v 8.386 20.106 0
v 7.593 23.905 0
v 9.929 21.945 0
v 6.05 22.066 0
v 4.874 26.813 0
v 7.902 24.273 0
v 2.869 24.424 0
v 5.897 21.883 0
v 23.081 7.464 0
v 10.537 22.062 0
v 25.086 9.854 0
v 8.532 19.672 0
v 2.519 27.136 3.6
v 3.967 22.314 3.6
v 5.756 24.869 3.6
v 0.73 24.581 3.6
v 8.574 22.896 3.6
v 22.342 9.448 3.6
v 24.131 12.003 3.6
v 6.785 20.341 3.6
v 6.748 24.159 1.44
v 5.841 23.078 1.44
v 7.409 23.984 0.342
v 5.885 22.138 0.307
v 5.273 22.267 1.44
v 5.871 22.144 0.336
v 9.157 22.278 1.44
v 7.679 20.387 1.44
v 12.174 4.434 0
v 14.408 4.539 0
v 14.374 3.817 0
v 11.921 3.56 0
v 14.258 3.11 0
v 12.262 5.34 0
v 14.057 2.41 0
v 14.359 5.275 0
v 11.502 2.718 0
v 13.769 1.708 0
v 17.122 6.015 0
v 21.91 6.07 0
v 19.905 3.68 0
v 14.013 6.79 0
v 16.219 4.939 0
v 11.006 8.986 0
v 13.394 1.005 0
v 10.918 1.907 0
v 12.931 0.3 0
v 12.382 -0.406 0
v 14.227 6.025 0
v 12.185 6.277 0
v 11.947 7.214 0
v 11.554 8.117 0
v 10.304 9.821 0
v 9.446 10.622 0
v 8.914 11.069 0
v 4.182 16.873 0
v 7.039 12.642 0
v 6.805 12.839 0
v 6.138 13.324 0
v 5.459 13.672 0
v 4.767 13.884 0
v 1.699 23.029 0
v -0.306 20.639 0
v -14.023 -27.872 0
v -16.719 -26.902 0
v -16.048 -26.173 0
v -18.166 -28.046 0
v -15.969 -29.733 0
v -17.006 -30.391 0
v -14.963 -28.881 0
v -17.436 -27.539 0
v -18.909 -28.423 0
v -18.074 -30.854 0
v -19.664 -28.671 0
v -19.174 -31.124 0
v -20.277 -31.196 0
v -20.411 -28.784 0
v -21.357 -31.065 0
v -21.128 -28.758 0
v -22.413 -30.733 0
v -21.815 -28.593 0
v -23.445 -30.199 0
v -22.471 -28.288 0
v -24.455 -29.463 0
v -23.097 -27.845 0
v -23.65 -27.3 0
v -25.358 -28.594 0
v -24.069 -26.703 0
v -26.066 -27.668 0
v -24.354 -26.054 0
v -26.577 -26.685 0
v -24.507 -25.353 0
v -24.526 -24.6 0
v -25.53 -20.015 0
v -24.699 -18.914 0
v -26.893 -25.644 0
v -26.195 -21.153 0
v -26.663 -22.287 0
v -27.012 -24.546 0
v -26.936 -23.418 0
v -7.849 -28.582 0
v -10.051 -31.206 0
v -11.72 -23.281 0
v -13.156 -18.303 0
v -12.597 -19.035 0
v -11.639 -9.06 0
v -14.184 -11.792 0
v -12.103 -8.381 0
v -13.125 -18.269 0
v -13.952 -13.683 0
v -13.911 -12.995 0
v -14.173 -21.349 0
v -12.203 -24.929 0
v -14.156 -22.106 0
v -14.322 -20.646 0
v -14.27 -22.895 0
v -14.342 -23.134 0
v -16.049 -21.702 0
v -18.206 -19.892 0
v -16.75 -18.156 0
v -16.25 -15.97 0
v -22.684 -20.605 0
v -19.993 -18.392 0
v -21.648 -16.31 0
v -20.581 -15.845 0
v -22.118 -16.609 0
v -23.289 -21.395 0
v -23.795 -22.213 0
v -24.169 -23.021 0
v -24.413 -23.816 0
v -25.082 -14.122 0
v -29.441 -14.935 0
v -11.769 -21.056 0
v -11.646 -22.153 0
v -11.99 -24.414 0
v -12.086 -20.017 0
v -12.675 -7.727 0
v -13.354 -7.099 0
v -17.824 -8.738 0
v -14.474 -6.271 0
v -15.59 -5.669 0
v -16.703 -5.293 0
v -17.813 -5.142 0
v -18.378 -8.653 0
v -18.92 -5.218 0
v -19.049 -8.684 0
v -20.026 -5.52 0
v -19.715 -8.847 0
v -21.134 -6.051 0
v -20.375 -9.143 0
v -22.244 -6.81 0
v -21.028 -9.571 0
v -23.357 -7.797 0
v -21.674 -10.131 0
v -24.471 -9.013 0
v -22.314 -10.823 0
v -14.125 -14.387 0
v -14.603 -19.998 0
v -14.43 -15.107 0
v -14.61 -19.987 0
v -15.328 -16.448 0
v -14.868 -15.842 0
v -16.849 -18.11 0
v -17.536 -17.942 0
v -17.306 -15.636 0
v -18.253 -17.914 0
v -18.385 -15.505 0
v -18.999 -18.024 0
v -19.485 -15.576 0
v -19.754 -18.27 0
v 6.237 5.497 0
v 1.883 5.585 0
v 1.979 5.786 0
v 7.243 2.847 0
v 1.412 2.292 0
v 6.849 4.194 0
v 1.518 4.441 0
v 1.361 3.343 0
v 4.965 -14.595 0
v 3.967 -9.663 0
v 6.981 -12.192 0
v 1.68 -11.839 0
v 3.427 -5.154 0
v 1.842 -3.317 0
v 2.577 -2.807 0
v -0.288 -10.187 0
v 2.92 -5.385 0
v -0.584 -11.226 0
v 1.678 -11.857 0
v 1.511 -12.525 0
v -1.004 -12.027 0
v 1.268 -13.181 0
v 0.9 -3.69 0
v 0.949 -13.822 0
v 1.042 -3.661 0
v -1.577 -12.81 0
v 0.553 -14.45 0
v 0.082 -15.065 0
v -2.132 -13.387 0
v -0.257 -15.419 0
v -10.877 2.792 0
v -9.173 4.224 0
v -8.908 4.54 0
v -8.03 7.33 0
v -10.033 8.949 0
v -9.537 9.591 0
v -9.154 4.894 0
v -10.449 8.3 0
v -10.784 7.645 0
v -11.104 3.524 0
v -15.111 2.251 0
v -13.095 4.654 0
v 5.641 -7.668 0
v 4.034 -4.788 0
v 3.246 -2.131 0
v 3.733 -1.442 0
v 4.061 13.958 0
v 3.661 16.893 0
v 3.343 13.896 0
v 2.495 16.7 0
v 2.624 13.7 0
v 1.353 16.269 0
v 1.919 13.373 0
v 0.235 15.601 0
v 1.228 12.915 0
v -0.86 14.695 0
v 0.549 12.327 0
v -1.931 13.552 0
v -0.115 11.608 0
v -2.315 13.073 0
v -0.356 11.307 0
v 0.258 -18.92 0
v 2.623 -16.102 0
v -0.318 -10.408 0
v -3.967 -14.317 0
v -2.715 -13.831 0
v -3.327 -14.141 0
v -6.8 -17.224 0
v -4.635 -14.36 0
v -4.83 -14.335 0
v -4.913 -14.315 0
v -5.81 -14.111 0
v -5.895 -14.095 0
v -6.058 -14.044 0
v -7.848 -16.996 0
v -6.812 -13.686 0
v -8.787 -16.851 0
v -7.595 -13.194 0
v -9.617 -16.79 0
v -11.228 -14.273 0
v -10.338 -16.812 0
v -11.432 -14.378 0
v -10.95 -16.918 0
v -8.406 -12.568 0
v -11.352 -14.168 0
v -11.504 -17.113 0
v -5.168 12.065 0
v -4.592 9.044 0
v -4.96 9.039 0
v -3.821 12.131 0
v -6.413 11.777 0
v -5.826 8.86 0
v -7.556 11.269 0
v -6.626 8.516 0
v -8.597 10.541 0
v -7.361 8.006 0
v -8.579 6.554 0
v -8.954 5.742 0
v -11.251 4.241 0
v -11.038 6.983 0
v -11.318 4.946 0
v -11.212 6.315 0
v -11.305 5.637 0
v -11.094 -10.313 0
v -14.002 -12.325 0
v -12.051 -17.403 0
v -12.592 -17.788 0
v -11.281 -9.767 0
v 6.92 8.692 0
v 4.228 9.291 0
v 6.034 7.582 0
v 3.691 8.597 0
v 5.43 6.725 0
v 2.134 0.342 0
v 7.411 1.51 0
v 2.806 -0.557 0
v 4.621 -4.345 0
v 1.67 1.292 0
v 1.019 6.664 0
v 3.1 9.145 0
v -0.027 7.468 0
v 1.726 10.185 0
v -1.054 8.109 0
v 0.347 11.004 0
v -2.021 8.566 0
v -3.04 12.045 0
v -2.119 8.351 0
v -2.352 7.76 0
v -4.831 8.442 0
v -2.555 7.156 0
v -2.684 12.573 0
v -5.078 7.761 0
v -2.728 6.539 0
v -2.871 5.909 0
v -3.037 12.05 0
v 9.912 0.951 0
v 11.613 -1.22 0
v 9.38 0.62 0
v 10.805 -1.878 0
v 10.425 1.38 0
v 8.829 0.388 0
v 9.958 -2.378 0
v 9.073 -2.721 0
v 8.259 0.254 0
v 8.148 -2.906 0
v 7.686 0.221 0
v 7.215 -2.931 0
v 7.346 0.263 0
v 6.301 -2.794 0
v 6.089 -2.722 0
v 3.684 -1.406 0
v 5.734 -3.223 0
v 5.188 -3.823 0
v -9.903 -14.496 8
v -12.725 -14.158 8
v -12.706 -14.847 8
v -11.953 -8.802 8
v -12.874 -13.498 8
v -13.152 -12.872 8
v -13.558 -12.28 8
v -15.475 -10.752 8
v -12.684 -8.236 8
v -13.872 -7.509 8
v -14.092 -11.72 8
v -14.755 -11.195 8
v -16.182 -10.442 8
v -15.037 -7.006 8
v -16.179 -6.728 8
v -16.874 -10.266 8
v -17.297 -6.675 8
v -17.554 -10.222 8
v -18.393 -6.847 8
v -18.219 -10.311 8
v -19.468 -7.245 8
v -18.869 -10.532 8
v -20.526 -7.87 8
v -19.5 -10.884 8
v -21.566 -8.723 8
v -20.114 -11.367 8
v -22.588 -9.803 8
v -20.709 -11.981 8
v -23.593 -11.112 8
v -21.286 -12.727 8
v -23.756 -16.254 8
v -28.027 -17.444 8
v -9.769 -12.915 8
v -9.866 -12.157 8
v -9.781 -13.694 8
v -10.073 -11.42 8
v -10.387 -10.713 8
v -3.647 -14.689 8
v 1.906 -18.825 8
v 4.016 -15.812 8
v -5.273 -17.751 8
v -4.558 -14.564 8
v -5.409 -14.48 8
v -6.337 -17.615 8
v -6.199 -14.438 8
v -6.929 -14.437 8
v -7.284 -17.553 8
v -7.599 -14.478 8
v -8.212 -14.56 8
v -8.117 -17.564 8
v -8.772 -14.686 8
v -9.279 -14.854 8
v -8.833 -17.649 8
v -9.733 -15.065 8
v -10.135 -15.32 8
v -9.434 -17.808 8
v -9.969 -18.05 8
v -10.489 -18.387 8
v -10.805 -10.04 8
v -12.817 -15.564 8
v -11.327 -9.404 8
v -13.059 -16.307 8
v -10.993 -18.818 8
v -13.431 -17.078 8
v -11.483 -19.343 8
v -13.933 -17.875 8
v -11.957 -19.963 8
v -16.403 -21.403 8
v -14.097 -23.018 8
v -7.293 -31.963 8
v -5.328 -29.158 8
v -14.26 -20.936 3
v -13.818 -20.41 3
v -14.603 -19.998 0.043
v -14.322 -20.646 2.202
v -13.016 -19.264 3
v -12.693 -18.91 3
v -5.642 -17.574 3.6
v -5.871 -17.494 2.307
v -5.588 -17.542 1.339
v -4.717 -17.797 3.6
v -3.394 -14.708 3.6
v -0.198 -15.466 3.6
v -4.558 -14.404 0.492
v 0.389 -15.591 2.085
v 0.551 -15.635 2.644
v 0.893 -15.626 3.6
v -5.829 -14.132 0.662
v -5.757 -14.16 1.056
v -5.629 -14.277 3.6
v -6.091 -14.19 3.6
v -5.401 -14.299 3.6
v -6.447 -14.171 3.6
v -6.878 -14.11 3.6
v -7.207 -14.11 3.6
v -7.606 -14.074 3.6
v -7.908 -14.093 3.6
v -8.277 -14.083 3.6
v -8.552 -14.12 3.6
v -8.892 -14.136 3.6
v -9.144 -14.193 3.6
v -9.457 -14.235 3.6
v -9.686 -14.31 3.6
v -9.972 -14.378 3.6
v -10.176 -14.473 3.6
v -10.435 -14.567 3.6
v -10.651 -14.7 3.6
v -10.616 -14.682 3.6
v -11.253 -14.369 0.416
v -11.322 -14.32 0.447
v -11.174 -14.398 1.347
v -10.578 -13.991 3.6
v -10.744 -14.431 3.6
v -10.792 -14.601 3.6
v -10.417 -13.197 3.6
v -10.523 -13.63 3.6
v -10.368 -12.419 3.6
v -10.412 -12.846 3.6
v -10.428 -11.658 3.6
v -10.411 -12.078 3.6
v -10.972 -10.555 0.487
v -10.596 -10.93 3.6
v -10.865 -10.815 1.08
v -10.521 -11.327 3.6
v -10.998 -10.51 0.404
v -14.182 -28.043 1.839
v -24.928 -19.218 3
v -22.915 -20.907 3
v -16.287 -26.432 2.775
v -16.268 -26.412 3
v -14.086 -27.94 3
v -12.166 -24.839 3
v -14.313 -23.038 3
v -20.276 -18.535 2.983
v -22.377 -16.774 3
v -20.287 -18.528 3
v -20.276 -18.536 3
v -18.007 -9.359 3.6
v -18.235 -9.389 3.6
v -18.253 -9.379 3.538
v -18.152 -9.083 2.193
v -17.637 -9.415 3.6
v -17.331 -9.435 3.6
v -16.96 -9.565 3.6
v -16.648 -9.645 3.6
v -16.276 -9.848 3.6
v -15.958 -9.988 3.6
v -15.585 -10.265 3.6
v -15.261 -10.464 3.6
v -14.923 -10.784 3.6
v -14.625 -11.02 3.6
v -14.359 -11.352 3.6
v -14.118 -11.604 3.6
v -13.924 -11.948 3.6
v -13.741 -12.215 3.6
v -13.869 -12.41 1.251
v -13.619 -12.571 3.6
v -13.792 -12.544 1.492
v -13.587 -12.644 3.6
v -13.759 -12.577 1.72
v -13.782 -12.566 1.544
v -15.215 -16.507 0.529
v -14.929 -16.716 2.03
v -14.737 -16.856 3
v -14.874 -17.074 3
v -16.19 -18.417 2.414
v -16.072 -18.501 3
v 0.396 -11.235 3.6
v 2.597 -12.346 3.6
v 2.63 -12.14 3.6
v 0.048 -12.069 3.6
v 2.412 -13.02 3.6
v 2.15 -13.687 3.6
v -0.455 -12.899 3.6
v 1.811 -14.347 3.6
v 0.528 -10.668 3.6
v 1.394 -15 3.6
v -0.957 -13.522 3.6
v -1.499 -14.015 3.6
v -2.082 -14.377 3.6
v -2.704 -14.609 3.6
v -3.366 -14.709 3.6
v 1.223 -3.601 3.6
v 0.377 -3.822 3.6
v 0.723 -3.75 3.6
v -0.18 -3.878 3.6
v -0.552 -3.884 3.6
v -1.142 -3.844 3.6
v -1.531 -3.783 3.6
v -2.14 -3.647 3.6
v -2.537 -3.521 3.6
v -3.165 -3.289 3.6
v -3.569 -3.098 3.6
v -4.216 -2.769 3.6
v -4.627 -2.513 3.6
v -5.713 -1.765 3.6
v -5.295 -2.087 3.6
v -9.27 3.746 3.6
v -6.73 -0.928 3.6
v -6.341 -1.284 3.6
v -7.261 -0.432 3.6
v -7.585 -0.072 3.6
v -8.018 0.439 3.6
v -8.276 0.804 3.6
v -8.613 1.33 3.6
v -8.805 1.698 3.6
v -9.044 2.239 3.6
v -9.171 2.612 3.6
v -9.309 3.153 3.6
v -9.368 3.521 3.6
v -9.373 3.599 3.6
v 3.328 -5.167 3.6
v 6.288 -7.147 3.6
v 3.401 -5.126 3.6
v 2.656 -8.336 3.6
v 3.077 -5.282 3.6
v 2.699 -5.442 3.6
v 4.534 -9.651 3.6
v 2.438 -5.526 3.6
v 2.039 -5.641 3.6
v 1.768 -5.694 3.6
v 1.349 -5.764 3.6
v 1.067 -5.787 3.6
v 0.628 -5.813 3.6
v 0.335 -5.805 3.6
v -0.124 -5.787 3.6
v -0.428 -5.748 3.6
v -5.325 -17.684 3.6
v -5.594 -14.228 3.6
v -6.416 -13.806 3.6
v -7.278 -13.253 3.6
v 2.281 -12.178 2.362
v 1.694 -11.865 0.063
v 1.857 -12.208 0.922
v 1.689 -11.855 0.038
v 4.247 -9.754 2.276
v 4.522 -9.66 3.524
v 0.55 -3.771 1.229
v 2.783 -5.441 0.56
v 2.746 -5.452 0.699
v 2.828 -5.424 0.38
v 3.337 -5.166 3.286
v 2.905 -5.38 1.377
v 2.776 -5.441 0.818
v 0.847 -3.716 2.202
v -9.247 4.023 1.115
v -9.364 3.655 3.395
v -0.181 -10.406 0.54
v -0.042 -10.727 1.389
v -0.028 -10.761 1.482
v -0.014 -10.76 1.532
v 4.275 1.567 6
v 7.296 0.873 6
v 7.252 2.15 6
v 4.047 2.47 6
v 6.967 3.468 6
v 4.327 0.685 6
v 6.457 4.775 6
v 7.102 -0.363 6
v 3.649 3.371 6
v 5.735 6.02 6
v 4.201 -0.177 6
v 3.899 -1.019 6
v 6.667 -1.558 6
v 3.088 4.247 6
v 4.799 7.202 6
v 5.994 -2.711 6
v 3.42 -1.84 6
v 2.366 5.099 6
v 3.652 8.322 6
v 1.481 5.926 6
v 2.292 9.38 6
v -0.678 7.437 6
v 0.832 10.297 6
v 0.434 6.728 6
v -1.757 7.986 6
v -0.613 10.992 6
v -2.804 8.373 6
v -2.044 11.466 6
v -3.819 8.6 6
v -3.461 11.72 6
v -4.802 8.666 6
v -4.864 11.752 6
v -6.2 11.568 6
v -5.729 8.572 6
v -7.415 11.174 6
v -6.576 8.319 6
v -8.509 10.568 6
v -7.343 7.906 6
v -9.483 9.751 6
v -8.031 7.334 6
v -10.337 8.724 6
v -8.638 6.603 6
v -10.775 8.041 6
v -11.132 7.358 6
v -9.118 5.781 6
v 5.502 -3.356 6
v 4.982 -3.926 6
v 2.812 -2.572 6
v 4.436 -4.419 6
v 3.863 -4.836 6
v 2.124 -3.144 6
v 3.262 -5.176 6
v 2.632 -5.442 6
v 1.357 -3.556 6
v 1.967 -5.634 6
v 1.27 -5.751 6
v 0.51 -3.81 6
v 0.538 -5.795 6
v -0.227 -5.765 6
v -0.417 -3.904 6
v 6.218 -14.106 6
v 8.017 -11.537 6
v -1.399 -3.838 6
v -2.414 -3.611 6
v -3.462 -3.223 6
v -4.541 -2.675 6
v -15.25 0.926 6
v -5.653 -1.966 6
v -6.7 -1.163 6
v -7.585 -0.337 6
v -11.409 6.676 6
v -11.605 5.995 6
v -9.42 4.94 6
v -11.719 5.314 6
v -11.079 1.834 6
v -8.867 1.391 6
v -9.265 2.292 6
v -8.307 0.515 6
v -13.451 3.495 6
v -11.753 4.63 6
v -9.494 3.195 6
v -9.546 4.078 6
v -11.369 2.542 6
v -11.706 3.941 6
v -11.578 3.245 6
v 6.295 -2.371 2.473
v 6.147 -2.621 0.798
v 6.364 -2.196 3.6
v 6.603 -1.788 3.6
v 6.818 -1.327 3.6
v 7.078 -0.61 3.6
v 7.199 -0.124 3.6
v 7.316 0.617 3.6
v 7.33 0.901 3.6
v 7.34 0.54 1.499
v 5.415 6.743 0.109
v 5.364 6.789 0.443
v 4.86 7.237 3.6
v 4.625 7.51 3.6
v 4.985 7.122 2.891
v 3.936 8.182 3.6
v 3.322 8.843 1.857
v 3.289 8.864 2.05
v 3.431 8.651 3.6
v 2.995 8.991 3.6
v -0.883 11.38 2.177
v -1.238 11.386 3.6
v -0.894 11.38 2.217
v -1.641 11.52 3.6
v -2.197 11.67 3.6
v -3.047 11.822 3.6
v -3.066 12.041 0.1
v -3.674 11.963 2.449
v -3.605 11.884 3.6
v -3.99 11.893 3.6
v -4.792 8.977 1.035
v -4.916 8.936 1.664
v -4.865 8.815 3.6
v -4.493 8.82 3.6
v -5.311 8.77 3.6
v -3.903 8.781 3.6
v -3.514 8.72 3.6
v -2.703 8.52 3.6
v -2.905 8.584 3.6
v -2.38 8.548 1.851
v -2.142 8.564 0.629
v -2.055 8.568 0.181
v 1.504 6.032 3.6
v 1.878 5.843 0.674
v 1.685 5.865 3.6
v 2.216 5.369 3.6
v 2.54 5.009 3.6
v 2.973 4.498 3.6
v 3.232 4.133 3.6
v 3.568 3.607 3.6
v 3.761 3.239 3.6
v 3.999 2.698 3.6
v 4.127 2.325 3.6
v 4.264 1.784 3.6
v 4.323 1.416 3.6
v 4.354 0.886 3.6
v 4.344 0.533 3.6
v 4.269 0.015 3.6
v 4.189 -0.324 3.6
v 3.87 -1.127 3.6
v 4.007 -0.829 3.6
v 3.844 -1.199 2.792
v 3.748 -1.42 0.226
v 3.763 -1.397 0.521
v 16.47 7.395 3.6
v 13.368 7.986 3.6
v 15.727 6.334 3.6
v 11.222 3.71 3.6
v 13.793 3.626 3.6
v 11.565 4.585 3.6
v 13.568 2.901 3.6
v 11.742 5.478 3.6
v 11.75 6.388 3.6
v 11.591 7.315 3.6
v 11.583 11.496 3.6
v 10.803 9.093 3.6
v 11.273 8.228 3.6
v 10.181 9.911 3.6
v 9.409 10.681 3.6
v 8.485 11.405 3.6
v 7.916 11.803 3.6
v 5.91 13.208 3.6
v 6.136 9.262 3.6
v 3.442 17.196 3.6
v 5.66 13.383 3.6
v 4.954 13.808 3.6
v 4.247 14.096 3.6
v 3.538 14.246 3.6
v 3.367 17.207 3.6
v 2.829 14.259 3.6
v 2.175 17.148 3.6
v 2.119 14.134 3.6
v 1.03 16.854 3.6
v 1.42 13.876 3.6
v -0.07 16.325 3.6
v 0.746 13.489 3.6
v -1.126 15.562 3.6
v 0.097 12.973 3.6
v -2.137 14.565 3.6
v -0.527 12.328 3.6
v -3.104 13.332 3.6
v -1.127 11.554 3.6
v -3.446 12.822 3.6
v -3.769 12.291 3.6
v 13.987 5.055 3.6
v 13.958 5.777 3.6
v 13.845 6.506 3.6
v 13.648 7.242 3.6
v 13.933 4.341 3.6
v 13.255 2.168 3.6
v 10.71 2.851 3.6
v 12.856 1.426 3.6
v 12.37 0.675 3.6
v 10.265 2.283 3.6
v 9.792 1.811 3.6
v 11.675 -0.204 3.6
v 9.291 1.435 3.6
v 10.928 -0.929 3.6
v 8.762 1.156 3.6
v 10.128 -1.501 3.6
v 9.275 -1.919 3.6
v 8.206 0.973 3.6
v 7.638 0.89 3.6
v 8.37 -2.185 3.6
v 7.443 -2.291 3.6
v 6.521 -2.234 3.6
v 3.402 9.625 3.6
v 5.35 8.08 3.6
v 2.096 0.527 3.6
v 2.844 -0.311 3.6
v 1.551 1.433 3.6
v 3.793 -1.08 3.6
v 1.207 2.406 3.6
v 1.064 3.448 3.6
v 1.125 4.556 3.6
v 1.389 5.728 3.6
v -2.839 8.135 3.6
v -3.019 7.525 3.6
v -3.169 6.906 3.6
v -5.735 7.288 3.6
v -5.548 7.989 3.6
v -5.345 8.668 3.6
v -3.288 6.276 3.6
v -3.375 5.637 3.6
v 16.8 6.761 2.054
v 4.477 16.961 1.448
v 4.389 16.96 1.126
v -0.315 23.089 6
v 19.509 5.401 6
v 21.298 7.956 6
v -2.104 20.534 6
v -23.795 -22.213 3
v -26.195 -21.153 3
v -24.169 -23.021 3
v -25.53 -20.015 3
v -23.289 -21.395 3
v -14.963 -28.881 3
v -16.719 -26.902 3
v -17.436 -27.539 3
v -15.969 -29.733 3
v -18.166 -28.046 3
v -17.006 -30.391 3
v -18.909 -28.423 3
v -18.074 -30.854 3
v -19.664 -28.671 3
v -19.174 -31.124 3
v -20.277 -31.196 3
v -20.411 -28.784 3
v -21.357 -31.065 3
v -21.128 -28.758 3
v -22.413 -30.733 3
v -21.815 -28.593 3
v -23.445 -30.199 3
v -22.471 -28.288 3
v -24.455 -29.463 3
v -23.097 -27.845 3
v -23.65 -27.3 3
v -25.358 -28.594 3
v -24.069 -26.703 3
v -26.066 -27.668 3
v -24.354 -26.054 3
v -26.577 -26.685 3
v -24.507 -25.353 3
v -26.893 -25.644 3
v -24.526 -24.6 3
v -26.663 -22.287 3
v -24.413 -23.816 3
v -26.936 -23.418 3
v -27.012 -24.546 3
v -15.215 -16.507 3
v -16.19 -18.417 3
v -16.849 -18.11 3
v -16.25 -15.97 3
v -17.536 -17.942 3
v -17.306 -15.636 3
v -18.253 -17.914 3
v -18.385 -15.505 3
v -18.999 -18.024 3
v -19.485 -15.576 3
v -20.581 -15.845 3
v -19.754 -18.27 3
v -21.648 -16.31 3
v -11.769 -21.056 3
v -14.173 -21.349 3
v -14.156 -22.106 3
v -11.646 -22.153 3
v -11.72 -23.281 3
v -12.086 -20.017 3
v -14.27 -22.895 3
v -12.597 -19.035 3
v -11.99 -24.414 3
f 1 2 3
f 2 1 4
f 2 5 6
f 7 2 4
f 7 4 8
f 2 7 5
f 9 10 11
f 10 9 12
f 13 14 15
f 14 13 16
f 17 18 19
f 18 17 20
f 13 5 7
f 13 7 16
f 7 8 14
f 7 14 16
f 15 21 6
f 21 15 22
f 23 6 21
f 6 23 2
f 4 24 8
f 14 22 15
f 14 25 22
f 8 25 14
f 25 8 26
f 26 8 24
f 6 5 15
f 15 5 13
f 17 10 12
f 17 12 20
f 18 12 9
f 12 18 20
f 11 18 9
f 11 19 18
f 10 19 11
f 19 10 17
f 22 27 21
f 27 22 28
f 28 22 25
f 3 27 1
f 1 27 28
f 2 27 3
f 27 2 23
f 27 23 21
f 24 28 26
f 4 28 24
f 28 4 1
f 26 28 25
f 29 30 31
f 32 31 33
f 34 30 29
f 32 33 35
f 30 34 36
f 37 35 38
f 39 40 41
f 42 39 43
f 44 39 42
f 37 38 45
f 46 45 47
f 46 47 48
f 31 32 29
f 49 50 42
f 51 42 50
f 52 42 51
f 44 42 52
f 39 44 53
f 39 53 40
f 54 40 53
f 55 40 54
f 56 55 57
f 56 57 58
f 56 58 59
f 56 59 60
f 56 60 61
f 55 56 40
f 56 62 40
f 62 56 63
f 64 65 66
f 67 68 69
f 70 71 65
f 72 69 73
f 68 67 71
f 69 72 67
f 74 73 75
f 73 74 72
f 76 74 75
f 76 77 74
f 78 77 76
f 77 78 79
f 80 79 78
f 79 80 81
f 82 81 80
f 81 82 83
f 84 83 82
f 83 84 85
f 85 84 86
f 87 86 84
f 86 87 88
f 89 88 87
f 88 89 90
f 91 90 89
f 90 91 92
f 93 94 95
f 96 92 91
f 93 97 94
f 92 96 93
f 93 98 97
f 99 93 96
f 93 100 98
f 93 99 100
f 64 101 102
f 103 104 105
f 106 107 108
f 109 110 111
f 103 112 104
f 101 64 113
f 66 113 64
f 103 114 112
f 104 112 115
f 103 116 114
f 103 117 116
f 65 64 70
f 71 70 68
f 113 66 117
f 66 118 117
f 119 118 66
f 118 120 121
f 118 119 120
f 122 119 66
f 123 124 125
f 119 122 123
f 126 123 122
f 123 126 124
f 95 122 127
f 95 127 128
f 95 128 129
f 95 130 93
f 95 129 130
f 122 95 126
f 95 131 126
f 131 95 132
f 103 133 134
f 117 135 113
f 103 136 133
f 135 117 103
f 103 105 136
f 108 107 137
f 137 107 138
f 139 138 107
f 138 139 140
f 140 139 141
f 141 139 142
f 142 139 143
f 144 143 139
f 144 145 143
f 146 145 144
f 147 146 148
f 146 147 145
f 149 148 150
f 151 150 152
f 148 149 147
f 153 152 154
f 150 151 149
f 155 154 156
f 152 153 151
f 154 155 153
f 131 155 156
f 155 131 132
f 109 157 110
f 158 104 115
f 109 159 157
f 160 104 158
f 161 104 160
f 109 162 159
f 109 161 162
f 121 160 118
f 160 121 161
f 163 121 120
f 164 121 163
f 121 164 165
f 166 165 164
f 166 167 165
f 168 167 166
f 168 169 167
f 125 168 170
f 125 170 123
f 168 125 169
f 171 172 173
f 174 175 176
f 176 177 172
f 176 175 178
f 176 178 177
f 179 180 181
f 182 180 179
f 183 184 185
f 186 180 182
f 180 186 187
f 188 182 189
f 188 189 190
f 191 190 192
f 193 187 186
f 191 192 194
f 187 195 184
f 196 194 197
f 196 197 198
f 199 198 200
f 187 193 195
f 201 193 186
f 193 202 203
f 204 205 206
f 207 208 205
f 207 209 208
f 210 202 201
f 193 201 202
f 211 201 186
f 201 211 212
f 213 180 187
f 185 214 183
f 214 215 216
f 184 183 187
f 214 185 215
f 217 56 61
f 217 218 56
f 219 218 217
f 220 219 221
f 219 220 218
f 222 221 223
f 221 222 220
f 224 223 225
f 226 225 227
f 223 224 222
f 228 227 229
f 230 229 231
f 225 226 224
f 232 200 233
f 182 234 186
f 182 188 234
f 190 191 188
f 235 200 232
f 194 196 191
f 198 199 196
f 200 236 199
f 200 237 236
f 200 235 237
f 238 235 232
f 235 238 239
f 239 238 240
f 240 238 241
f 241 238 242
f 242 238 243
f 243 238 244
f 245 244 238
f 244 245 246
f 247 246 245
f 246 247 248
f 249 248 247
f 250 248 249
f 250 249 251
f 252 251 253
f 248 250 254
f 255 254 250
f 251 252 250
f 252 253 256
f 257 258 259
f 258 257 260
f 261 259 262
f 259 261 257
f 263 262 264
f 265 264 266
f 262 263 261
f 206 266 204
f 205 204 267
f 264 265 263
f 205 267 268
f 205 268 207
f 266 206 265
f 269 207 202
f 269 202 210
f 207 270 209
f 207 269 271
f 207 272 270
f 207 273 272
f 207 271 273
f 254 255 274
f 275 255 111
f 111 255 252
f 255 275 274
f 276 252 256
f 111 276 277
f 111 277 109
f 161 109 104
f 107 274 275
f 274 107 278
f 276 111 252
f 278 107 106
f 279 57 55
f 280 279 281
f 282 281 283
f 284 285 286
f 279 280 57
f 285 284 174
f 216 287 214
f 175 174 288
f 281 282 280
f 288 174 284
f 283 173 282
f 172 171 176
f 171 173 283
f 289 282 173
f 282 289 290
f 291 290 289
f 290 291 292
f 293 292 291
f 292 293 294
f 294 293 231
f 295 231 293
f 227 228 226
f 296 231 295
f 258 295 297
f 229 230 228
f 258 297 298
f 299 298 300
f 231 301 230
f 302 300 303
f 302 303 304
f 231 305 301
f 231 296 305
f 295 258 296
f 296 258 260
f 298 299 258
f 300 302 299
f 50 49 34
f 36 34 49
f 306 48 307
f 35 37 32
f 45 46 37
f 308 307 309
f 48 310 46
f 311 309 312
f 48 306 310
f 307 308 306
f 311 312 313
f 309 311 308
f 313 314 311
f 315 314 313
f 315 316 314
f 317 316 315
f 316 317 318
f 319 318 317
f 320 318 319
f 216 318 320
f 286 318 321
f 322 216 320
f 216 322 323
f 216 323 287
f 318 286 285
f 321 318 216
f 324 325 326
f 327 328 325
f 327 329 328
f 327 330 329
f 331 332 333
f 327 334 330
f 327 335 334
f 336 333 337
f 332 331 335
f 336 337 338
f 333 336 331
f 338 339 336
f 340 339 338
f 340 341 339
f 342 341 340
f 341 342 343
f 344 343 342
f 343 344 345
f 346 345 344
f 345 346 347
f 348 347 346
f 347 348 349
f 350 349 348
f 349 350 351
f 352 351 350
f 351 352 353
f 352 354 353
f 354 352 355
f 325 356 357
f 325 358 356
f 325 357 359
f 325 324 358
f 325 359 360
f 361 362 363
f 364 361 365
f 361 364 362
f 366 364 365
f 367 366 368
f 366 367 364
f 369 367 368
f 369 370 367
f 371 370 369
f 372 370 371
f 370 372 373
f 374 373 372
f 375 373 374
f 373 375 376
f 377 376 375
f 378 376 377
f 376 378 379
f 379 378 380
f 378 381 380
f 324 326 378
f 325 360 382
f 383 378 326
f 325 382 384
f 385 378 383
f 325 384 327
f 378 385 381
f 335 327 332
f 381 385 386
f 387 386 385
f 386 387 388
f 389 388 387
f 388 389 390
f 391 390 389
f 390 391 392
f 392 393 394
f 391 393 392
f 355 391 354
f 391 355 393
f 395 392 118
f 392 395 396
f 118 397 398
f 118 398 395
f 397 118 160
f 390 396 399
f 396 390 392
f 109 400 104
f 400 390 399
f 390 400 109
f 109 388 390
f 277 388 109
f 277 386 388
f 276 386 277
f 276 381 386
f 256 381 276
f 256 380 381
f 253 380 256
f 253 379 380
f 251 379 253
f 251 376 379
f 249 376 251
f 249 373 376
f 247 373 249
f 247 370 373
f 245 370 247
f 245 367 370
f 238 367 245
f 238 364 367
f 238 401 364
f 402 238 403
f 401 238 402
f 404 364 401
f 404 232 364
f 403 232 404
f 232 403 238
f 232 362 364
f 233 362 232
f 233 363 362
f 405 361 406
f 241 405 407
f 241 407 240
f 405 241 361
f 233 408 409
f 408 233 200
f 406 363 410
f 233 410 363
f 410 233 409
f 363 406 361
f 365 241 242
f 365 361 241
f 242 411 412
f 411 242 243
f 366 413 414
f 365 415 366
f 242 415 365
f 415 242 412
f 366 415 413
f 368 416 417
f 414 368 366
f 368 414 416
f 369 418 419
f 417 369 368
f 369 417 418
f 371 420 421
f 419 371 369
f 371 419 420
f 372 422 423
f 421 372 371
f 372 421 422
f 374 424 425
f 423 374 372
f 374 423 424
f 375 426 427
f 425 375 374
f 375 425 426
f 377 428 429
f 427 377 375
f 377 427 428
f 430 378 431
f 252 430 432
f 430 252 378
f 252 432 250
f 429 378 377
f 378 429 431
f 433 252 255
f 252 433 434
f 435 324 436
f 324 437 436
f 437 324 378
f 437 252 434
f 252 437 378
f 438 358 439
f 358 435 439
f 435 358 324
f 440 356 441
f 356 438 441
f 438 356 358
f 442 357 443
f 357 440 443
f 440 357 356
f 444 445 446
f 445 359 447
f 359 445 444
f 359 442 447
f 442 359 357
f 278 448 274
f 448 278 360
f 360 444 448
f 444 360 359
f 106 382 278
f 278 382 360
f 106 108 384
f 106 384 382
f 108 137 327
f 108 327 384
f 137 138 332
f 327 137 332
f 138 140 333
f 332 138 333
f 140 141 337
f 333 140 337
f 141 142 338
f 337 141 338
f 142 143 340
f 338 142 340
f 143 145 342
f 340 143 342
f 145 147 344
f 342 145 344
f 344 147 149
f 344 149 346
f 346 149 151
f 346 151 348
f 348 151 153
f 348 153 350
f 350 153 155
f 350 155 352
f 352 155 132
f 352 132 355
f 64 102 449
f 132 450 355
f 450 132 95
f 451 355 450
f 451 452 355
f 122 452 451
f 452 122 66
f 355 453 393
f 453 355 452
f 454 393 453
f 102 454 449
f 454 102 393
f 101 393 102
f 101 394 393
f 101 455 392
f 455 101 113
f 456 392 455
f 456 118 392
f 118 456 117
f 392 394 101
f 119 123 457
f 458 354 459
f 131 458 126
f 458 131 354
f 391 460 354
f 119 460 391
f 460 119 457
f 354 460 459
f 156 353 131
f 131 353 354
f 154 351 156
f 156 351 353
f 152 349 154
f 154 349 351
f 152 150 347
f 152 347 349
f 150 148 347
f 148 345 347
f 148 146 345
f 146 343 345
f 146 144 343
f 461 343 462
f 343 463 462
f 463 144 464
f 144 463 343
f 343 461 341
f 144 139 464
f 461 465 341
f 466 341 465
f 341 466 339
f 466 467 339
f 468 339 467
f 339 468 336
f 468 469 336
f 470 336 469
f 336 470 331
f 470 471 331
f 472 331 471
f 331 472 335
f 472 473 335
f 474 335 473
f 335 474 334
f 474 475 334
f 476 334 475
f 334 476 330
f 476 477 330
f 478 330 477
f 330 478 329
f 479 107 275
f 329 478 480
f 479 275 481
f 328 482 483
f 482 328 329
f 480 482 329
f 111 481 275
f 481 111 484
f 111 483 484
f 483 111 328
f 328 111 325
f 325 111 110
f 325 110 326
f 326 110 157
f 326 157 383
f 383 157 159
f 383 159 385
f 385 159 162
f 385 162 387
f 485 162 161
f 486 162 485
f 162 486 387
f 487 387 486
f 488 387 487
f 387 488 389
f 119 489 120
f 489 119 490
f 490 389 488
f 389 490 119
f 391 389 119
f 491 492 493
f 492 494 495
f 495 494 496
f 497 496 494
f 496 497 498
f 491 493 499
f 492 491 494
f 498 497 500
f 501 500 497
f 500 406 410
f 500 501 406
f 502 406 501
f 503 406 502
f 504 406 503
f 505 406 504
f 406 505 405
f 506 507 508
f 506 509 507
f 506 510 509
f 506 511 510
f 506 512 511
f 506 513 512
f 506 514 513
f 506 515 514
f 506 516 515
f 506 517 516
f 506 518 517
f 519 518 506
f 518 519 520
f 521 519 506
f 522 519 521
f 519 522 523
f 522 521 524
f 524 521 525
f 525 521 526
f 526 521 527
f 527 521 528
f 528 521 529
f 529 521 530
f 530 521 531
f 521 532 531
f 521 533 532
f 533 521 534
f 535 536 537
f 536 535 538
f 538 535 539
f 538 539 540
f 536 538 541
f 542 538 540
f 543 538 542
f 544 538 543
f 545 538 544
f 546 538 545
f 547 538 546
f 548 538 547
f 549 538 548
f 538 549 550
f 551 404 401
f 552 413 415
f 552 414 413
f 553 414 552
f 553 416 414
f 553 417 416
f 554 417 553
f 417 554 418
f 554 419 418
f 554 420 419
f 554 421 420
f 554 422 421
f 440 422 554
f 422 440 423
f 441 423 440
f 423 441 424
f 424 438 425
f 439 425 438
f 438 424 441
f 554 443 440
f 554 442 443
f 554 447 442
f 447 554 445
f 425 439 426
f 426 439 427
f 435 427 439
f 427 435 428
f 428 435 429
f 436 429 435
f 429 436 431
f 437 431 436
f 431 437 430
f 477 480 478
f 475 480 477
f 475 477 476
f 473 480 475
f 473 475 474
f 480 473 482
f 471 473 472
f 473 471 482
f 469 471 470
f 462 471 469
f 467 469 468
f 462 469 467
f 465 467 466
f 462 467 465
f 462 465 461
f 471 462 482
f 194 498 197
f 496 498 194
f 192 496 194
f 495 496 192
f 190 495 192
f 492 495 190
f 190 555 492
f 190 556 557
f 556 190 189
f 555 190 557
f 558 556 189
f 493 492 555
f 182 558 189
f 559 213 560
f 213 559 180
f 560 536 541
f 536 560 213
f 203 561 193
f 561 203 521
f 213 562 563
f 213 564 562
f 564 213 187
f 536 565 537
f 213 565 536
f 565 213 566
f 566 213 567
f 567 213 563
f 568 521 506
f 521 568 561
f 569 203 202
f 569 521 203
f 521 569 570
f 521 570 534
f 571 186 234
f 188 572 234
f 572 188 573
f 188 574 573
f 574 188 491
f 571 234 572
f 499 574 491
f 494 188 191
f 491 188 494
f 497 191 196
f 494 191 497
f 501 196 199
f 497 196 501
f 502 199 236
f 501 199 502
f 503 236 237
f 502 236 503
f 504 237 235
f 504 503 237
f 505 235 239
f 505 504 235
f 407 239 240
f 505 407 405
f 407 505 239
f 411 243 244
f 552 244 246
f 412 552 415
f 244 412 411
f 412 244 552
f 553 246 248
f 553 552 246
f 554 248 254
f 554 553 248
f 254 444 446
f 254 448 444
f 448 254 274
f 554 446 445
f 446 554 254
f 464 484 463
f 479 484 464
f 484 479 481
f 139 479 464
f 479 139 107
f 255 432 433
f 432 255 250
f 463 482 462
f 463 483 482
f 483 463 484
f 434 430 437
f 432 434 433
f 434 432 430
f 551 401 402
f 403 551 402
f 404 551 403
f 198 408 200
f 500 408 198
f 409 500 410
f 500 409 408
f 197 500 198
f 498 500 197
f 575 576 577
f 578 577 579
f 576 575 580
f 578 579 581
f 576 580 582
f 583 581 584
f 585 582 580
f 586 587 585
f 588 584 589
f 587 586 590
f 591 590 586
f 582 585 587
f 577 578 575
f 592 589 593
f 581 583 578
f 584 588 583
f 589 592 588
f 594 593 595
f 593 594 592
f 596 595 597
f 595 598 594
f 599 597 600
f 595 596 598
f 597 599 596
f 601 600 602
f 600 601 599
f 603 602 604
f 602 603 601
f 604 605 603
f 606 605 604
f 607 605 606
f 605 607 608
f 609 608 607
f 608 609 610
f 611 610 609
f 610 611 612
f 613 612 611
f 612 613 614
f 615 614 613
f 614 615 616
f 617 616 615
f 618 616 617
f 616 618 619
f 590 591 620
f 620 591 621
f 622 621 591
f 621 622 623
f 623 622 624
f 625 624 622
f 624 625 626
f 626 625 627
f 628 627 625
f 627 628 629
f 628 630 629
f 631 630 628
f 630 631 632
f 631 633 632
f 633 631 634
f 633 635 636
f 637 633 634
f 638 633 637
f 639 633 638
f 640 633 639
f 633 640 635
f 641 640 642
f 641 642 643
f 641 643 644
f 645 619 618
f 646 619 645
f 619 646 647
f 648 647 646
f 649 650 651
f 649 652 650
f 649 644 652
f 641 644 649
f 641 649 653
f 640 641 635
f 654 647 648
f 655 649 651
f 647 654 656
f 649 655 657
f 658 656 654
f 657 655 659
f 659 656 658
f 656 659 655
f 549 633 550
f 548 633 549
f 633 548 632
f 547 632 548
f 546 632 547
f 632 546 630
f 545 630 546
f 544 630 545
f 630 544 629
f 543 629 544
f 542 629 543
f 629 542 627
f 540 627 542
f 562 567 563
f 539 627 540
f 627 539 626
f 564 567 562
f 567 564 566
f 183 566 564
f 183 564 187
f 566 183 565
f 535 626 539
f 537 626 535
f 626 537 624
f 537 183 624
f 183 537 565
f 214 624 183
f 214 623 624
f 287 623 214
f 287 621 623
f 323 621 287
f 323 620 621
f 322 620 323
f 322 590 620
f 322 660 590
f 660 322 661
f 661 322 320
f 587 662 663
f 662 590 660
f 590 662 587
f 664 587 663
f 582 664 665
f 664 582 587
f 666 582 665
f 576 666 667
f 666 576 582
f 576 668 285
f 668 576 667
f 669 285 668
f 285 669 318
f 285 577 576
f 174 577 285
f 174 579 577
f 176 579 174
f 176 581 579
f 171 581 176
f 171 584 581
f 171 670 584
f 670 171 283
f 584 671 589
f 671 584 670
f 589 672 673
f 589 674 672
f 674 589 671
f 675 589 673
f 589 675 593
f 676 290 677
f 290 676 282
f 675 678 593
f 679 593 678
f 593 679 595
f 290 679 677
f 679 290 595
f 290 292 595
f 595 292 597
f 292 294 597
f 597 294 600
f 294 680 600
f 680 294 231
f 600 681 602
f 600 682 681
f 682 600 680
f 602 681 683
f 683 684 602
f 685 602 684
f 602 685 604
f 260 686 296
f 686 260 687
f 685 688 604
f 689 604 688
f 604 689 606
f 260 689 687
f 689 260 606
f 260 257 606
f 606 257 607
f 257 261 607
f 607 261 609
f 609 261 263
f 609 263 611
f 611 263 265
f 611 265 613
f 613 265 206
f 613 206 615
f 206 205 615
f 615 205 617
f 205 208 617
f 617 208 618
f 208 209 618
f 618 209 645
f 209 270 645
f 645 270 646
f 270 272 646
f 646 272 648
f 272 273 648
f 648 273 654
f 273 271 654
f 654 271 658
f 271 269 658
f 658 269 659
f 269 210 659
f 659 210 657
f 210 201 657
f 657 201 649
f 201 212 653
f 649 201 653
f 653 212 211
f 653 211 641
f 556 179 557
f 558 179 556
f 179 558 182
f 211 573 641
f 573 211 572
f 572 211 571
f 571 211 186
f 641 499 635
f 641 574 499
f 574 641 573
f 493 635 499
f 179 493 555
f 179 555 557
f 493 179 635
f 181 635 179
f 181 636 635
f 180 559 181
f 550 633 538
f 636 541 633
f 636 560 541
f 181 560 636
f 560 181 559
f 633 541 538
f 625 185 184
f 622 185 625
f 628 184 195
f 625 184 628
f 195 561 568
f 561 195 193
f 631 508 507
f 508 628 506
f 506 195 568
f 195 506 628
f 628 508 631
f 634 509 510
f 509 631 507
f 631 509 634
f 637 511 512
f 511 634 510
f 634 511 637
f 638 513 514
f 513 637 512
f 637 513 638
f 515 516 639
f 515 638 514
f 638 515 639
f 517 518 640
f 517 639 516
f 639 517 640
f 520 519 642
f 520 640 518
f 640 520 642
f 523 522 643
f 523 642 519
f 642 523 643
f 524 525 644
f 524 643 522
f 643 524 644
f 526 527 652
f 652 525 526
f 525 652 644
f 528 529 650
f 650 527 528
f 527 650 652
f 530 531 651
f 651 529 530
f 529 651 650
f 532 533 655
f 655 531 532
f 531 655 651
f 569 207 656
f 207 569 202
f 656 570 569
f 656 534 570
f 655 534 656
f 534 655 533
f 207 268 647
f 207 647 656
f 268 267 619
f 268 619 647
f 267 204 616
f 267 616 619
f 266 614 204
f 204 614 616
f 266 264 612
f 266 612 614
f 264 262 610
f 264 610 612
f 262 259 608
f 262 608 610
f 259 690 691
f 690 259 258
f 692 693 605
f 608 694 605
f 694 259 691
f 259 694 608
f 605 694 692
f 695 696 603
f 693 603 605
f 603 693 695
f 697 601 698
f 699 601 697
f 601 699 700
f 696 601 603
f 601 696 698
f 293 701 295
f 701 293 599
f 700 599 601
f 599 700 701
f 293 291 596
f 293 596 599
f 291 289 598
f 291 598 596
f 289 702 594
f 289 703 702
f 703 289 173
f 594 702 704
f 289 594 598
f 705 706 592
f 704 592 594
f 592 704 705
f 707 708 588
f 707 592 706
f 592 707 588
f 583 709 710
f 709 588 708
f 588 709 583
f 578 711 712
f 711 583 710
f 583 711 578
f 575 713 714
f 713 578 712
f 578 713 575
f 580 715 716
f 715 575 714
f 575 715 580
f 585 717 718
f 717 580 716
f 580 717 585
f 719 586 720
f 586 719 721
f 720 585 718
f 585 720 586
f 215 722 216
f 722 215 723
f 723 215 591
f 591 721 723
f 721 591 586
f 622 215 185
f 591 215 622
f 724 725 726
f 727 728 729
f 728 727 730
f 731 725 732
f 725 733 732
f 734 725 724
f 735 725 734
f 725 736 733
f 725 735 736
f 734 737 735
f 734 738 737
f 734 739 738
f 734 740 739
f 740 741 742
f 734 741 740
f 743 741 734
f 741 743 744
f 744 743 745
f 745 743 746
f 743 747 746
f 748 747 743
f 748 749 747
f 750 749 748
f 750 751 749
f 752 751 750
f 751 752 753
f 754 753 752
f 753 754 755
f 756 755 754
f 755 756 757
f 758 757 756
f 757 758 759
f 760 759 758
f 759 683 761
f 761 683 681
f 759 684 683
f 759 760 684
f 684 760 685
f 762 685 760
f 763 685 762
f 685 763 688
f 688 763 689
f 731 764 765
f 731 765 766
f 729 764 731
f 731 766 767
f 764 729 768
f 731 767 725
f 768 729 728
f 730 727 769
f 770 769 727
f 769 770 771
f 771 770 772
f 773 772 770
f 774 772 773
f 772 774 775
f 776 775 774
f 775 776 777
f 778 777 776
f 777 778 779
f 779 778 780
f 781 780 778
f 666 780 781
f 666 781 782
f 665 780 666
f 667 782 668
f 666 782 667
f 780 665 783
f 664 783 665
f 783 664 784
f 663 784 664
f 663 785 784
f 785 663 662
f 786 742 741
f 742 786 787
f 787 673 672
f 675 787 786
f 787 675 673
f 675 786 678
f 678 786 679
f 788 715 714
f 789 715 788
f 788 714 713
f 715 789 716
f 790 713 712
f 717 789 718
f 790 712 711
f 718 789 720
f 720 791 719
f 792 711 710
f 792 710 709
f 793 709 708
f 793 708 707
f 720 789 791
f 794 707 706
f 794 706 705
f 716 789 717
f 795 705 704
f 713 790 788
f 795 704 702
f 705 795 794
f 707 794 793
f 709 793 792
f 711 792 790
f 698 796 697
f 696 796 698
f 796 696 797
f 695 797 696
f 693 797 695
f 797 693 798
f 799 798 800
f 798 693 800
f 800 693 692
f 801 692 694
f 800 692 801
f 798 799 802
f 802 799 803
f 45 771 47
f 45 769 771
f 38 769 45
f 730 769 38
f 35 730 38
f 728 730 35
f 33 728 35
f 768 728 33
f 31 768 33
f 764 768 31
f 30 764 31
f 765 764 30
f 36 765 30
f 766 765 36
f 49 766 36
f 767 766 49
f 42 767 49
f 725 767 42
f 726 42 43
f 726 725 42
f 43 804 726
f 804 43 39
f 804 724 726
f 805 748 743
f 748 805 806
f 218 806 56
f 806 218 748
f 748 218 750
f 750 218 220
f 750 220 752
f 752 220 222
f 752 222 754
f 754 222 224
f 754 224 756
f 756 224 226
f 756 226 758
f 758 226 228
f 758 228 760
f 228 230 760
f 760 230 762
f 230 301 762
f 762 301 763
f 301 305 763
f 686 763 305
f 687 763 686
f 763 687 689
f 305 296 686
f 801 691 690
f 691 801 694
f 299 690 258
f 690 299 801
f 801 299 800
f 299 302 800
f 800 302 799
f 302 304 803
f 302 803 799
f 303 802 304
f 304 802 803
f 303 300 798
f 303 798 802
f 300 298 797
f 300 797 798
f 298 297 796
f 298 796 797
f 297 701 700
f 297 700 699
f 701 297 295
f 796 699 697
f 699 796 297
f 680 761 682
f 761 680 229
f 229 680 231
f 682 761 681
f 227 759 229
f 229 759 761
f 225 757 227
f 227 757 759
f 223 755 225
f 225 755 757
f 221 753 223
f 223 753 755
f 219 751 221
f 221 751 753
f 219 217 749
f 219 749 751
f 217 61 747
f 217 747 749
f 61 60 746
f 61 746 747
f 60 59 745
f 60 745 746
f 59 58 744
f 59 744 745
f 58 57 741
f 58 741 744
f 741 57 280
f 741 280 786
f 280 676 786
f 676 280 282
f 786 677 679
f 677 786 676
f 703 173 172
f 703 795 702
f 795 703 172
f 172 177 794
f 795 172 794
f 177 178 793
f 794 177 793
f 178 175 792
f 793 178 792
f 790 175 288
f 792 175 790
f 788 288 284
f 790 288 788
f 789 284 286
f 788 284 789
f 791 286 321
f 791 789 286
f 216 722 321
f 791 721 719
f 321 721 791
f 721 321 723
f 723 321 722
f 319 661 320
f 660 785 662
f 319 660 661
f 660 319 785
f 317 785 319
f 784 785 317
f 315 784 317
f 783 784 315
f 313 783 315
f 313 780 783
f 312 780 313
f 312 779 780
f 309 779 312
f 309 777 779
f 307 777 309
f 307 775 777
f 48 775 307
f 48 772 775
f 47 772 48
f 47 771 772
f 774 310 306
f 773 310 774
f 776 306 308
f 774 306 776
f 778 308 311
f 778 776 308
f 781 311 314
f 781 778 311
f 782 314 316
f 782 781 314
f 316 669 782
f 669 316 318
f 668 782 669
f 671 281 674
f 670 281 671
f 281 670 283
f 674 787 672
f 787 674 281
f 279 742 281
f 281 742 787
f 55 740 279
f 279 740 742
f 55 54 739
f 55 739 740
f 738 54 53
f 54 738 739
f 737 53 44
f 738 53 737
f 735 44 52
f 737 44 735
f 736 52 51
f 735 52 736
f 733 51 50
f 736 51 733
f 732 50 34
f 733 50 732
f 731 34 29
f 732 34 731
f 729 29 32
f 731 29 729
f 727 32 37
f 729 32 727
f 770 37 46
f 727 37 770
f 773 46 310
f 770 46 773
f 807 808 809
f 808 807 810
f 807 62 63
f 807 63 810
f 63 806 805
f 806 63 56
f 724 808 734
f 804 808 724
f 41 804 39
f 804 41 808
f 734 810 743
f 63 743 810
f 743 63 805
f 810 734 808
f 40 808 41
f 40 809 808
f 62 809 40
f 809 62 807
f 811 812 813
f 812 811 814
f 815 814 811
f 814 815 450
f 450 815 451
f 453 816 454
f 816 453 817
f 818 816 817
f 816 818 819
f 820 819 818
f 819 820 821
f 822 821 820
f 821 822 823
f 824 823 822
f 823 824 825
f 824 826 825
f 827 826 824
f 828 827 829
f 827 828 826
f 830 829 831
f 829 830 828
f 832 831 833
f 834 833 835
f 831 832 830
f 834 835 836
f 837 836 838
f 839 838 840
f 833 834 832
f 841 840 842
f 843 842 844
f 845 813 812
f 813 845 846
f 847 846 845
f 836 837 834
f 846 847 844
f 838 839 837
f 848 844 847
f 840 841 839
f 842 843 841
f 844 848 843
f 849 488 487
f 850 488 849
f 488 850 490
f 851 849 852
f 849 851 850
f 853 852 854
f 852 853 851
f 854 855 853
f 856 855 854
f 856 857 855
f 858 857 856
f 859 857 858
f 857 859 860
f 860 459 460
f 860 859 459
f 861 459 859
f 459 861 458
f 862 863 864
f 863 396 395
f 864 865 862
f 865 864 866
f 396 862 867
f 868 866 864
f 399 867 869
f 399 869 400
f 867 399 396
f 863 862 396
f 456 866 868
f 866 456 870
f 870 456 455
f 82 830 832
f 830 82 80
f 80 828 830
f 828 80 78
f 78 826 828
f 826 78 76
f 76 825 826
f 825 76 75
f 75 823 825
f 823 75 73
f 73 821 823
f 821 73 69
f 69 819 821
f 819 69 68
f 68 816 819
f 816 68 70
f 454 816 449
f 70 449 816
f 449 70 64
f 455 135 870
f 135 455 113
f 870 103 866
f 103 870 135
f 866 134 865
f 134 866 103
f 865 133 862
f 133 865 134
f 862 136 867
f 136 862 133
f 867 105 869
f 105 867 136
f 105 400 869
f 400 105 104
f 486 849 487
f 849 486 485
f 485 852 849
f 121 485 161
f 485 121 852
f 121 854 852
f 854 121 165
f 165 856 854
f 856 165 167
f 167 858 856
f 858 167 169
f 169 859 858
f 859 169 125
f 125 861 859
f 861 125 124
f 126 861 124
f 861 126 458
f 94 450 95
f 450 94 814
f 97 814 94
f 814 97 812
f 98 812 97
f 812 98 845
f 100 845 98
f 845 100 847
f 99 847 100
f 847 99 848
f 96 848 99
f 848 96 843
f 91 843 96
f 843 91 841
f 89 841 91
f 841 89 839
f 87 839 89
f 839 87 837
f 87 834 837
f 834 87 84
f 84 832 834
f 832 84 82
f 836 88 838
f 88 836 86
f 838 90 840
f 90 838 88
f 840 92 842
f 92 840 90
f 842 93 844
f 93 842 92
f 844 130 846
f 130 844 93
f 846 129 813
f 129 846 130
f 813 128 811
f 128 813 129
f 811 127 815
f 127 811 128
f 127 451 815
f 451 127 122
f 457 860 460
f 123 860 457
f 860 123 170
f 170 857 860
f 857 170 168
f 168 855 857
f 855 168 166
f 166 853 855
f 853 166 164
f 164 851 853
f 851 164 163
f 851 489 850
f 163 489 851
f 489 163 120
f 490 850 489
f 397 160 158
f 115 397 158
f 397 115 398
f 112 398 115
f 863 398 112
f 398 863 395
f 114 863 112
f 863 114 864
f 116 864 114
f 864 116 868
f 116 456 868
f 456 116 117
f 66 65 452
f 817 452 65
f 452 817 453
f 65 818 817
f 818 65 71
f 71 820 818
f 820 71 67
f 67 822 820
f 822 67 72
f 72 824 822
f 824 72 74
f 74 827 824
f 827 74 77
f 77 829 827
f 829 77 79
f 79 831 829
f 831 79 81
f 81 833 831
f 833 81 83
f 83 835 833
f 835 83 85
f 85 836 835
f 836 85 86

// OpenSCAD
Font_name = "Chewy";
Text = "Rupali";
Rotation = 50;
Connect_dots = true;
Dot_bridge_height_percent = 40;

function char_w(c) = 
    (c == "m" || c == "w") ? 15.0 :
    (c == "i" || c == "l") ? 5.2 :
    (c == "j" || c == "t" || c == "f") ? 7.5 :
    (c >= "A" && c <= "Z") ? 14.0 :
    10.5;

function get_step_at(text, i) = 
    (i <= 0) ? 0 :
    ((char_w(text[i-1]) + char_w(text[i])) / 2 * 0.95);

function get_char_x_auto(text, i) = 
    (i <= 0) ? 0 : (get_char_x_auto(text, i - 1) + get_step_at(text, i));

span = get_char_x_auto(Text, len(Text)-1);
cx = span / 2;
loop_x = -cx - 8.5;
loop_y = 0;
twist = -5;
$fn = 32;

rotate([0, 0, Rotation]) {
    union() {
        // Loop
        color("DimGray")
        linear_extrude(height = 3, $fn = $fn)
            translate([loop_x, loop_y, 0]) rotate([0, 0, -90])
                text(size = 20, text = "o", font = Font_name, halign = "center", valign = "center", $fn = $fn);

        // Letters
        for (i = [0 : len(Text) - 1]) {
            h = (i == 0) ? 8.0 : ((i % 2 == 0) ? 6.0 : 3.6);
            char = Text[i];
            char_x = get_char_x_auto(Text, i) - cx;

            color([0.92, 0.72, 0.1]) {
                linear_extrude(height = h, twist = twist, $fn = $fn)
                    translate([char_x, 0, 0])
                        text(size = 25, text = char, font = Font_name, halign = "center", valign = "center", $fn = $fn);

                if (Connect_dots) {
                    bridge_factor = Dot_bridge_height_percent / 100;
                    bridge_h = h * bridge_factor;
                    bridge_twist = twist * bridge_factor;
                    if (char == "i") {
                        linear_extrude(height = bridge_h, twist = bridge_twist, $fn = $fn)
                            translate([char_x, 0, 0])
                                translate([-1.2, 6.5]) square([2.4, 4.0]);
                    }
                    if (char == "j") {
                        linear_extrude(height = bridge_h, twist = bridge_twist, $fn = $fn)
                            translate([char_x, 0, 0])
                                translate([-1.2, 11.0]) square([2.4, 4.0]);
                    }
                }
            }
        }
    }
}
